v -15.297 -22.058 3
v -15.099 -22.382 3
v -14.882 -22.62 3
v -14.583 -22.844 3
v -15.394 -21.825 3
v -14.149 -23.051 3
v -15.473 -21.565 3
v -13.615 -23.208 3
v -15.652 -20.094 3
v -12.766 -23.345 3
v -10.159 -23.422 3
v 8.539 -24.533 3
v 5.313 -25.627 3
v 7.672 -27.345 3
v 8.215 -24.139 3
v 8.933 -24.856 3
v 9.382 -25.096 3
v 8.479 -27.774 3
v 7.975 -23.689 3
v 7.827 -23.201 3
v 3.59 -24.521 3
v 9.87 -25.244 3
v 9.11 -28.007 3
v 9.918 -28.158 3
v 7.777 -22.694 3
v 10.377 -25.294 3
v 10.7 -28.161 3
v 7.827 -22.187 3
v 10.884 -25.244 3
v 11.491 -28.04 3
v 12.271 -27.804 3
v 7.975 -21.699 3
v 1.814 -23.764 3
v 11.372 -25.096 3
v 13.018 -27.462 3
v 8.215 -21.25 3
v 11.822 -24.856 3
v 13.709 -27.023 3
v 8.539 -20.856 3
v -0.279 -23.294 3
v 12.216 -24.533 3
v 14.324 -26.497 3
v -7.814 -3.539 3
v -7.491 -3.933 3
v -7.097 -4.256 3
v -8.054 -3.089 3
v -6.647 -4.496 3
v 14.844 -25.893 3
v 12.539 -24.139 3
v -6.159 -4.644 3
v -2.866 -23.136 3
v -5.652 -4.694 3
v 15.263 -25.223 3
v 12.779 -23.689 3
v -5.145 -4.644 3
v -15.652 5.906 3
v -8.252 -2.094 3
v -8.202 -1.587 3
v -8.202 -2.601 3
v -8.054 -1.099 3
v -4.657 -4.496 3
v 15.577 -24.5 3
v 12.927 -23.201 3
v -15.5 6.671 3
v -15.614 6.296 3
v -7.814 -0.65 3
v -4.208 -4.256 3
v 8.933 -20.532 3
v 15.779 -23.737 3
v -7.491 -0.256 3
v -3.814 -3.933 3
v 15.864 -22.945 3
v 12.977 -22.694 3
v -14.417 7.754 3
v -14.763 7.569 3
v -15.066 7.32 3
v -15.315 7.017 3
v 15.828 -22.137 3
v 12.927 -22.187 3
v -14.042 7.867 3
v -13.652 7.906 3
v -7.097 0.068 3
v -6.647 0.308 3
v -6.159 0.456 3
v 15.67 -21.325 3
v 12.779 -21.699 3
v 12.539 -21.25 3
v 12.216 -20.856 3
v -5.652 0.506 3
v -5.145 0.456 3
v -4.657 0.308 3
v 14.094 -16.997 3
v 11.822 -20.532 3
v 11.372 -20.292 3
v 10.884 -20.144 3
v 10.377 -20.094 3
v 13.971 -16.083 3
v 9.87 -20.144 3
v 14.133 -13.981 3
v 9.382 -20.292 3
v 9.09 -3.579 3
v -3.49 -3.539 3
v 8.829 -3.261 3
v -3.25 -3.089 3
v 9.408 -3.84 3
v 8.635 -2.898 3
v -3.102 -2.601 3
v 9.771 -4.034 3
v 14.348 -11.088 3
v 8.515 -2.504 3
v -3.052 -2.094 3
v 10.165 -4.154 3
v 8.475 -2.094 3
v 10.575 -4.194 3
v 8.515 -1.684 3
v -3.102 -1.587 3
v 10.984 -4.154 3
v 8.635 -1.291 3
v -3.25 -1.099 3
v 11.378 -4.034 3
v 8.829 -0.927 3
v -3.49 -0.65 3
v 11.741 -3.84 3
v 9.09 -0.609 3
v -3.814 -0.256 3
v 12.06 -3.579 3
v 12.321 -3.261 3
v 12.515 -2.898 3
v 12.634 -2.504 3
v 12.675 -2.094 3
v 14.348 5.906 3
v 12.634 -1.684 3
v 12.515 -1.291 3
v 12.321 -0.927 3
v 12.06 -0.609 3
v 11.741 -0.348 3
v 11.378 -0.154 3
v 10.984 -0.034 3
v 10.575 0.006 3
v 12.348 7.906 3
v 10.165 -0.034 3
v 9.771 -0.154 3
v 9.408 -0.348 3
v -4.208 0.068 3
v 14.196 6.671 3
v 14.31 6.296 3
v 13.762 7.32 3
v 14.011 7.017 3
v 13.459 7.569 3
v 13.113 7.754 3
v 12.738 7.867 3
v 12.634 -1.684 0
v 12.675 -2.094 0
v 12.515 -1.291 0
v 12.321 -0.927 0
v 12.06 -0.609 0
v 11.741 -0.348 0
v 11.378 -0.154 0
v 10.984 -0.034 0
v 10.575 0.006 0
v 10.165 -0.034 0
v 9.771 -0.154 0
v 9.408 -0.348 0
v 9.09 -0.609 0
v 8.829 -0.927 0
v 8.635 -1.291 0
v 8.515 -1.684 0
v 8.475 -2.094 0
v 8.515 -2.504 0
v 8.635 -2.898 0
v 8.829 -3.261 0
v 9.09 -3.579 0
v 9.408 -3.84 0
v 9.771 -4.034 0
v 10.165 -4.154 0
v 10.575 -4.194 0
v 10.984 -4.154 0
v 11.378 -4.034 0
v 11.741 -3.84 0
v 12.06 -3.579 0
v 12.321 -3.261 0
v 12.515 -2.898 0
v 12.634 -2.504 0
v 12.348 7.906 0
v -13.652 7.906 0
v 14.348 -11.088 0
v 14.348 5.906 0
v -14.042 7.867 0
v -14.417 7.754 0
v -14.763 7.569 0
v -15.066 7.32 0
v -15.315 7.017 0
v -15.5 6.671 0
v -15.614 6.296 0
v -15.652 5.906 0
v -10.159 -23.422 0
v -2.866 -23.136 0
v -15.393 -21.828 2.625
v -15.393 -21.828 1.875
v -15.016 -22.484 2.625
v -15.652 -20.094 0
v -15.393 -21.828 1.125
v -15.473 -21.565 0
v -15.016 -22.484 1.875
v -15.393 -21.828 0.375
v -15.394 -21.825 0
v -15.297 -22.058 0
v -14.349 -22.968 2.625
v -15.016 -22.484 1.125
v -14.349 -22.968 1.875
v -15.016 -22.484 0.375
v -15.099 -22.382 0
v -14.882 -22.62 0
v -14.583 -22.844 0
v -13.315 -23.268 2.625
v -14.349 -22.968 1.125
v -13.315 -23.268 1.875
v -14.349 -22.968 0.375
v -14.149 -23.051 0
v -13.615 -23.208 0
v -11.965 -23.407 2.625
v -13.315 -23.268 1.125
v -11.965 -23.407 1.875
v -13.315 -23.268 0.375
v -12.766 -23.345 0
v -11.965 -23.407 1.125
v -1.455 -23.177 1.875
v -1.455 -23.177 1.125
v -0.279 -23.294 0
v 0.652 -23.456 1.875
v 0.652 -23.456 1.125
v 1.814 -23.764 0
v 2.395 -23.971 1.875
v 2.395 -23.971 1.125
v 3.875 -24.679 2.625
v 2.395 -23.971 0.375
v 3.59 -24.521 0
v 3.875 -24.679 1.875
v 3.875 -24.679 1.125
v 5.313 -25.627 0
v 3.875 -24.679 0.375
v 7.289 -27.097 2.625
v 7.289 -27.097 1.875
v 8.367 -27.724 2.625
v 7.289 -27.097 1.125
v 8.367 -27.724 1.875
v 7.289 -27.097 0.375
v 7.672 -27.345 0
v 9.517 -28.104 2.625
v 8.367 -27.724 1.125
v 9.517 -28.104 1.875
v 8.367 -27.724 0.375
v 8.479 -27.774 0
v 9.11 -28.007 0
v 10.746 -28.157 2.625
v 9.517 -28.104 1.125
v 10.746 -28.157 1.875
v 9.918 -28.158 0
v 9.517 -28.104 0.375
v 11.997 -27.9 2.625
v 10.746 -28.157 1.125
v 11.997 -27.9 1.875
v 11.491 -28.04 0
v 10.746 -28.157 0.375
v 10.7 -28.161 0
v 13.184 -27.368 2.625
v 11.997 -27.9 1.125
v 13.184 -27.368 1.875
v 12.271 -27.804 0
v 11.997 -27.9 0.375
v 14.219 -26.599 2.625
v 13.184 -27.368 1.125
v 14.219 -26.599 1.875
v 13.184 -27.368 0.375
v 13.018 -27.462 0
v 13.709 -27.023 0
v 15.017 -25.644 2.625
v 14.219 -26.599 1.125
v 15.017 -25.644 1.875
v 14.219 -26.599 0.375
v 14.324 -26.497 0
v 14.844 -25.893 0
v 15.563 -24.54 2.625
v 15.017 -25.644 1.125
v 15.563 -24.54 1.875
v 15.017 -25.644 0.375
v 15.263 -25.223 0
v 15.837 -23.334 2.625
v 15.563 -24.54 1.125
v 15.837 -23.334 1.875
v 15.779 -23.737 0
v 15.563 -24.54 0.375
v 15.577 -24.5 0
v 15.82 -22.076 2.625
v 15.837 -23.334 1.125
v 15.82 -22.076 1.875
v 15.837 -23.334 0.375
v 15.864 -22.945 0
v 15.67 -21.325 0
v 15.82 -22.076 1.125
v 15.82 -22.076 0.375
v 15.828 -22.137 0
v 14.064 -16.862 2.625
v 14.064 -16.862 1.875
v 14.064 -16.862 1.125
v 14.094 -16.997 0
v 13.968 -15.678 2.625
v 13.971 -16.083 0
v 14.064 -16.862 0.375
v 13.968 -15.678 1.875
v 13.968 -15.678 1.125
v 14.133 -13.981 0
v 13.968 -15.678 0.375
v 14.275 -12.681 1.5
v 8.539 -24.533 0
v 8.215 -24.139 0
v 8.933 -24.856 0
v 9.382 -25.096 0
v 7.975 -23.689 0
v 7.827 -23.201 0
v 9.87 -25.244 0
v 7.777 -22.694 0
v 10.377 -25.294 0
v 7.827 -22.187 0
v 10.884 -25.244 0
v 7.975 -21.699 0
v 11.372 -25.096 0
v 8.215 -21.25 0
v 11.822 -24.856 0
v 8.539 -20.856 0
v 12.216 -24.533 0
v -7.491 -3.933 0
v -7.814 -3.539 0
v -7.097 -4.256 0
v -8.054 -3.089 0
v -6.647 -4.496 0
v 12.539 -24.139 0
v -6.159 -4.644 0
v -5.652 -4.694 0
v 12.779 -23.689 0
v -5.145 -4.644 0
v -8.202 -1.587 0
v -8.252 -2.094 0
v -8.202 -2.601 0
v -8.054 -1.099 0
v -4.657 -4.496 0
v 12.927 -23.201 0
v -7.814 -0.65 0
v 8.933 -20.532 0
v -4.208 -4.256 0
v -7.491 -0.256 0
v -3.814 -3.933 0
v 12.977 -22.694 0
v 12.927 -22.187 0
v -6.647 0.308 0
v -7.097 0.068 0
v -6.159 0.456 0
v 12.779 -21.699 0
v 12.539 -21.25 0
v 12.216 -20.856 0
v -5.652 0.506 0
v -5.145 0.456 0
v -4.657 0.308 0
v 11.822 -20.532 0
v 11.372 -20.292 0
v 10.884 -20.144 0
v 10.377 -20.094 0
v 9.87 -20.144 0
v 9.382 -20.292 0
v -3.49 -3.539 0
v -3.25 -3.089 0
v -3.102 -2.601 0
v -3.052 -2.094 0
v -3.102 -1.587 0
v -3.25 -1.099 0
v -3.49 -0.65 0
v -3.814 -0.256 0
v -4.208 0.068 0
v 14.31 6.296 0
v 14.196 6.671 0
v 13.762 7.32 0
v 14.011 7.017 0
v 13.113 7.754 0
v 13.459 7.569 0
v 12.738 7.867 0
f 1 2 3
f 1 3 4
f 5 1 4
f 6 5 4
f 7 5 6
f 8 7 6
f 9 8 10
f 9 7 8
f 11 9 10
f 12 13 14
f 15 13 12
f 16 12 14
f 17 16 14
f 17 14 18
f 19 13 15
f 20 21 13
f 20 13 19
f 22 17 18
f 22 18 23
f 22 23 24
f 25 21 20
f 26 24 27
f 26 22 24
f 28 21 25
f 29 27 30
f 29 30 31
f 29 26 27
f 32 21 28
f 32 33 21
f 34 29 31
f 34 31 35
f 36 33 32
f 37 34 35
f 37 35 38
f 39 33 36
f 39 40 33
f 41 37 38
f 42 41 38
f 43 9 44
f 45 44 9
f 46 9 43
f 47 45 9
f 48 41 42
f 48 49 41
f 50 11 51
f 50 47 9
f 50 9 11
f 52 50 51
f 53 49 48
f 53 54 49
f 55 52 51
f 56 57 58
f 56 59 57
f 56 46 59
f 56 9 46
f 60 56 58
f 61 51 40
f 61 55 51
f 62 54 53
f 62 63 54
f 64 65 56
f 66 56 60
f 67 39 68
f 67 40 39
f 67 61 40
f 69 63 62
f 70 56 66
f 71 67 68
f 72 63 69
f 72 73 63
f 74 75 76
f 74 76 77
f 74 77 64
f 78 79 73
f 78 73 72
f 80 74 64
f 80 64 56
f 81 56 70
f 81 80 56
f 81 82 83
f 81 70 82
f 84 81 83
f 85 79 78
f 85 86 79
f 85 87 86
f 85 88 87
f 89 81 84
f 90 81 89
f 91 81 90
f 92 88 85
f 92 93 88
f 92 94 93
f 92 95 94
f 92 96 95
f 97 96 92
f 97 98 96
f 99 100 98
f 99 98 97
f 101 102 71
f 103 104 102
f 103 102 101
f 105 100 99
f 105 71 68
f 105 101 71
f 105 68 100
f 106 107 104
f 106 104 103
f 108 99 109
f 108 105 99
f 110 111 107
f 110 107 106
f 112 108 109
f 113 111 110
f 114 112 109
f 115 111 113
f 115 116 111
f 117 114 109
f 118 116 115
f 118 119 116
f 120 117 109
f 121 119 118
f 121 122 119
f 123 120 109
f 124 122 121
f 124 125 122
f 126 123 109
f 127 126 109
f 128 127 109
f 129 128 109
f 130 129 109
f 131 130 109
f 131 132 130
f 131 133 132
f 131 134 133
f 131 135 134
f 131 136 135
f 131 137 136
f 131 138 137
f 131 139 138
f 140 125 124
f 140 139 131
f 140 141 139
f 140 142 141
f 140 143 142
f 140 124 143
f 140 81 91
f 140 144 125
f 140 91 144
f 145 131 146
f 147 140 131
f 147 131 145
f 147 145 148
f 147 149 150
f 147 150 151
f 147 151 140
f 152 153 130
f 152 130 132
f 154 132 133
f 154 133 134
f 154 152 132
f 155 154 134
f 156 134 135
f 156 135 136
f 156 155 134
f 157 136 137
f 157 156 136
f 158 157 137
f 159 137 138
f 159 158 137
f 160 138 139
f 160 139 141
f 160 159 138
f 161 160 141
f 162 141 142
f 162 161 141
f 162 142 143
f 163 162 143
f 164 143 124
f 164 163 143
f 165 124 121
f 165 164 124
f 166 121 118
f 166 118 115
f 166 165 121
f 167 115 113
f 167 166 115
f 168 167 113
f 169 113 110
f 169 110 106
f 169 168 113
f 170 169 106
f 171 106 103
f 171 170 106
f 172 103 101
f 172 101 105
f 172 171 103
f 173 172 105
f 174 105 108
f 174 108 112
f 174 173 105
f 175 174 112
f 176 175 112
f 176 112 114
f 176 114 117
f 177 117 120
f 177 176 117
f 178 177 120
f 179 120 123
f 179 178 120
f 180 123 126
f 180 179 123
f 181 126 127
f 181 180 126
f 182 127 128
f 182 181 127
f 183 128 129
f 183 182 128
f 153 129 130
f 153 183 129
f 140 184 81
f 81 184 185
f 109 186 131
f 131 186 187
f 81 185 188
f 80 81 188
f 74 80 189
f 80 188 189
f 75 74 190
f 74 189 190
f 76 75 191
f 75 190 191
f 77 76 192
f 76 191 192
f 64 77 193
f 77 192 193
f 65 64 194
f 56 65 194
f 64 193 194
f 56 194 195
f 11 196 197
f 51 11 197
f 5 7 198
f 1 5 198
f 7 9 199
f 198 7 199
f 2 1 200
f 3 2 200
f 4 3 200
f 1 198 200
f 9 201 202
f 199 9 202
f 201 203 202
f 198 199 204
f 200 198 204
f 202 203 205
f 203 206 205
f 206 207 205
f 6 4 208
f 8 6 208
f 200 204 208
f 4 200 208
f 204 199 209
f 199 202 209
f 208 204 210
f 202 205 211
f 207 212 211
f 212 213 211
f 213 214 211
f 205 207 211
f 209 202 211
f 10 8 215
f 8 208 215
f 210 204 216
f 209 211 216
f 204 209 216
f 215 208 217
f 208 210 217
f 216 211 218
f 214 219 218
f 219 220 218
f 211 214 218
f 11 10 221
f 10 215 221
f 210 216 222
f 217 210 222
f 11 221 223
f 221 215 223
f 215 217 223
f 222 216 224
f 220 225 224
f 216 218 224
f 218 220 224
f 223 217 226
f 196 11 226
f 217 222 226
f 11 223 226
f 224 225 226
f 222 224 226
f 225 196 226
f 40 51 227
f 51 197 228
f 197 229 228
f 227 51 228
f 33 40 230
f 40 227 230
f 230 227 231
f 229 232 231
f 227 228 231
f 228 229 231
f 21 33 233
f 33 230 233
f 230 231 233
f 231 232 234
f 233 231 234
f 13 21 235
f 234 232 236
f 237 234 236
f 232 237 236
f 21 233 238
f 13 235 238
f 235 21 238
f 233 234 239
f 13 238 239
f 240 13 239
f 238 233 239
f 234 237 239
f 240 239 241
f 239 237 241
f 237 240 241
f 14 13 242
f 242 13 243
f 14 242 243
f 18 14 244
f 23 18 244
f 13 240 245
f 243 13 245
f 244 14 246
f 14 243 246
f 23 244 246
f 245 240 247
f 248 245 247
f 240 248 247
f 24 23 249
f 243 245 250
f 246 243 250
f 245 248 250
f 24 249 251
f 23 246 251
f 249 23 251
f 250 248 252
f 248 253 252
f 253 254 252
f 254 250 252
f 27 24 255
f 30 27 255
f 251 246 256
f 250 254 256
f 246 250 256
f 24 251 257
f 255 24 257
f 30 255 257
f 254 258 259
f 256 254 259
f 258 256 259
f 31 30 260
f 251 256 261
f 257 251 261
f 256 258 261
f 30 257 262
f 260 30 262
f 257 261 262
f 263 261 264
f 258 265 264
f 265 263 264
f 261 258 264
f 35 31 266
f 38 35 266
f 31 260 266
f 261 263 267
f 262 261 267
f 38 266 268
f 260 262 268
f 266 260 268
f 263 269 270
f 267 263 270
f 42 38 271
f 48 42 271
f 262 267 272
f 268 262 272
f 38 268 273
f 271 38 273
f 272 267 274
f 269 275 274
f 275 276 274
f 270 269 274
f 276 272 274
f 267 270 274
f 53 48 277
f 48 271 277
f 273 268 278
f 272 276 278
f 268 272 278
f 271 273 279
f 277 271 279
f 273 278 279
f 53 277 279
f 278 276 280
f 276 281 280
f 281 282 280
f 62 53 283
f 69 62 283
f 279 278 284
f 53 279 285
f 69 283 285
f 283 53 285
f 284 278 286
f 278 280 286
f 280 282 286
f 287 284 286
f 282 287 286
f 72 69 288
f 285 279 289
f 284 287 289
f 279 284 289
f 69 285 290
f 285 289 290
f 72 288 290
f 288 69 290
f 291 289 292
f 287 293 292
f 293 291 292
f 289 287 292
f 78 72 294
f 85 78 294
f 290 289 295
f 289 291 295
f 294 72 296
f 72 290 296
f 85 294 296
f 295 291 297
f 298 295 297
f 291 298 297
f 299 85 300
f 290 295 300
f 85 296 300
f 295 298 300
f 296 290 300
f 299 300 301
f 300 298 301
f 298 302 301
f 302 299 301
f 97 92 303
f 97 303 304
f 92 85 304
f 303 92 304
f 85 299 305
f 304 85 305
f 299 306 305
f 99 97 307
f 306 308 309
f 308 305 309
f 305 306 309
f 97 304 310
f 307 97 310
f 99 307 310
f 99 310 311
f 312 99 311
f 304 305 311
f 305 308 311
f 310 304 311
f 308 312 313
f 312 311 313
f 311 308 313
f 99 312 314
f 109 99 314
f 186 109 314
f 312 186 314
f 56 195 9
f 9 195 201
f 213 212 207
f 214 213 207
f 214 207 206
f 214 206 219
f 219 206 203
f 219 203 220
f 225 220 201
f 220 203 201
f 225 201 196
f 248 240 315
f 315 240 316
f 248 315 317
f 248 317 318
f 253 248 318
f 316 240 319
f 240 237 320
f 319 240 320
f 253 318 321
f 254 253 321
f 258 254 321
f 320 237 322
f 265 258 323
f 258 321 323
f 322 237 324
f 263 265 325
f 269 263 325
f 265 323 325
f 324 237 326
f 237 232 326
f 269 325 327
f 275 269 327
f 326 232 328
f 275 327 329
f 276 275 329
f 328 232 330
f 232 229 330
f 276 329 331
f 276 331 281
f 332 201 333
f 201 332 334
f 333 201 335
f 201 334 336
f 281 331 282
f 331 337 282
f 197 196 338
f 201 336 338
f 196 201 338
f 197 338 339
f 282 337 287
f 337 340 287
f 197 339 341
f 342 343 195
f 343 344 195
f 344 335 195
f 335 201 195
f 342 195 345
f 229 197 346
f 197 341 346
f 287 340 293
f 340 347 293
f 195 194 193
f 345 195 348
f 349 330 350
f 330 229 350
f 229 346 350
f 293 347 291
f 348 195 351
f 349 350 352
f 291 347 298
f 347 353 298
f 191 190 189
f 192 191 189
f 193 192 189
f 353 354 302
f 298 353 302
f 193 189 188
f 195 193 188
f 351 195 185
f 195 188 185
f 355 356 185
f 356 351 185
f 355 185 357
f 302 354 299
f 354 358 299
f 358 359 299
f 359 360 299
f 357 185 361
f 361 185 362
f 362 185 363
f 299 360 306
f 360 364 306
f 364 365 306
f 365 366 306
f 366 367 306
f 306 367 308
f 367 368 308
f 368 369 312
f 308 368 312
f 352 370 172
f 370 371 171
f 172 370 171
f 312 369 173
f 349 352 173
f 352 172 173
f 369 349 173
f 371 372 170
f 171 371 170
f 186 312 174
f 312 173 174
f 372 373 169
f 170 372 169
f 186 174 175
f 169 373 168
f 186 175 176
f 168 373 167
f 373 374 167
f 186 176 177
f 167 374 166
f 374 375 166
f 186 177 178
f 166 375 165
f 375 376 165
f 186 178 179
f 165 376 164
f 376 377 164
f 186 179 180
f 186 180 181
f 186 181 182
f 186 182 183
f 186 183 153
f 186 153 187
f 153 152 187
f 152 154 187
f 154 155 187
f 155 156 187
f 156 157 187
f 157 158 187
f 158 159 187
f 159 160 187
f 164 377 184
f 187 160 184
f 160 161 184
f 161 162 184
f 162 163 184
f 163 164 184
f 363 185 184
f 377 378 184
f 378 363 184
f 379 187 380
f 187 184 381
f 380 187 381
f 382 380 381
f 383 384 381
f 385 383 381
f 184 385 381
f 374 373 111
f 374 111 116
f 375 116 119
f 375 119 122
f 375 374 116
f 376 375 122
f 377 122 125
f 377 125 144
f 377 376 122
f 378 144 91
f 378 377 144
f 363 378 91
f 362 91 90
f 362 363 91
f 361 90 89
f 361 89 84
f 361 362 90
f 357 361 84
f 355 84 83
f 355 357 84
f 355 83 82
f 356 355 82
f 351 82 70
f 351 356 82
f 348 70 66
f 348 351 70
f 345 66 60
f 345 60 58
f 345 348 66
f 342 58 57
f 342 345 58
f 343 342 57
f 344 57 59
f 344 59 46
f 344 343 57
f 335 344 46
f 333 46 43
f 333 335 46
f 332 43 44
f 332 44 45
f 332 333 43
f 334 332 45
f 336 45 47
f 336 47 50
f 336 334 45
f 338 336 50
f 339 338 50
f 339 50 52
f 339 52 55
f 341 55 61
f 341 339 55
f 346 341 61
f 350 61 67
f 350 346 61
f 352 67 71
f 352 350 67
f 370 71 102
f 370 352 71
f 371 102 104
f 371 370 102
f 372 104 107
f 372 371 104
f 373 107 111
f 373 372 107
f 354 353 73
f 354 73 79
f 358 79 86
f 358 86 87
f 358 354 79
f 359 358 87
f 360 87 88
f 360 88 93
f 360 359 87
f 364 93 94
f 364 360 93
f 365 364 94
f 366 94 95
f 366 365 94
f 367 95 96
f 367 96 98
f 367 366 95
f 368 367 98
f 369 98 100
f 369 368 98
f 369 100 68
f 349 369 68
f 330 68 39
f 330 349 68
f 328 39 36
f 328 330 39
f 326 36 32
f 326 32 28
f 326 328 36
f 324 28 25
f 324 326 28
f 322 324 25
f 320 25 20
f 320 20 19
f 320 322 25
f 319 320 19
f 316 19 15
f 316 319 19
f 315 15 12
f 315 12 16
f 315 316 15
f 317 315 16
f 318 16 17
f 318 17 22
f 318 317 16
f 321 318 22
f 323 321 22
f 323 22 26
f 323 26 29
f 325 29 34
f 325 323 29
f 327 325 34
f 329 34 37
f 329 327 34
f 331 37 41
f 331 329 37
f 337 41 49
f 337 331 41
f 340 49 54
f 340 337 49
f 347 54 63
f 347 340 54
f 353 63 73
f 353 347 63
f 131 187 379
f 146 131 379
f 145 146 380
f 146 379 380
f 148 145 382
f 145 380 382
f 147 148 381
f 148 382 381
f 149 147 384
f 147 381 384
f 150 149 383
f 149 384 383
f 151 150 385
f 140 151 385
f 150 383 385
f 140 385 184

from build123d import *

# Parameters (mm, degrees)
F0_R     = 2.6
F0_R_2   = 2.1
F1_DEPTH = 3


with BuildPart() as f1:
    # F0 (on Top) → F1 (new body)
    with BuildSketch(Plane.XY):
        with BuildLine():
            Line((12.3479472026, 7.9058583081), (-13.6520527974, 7.9058583081))
            ThreePointArc((-13.6520527974, 7.9058583081), (-15.0662663598, 7.3200718704), (-15.6520527974, 5.9058583081))
            Line((-15.6520527974, 5.9058583081), (-15.6520527974, -20.0941416919))
            add(Edge.make_bspline(
                [(-15.6520527974, -20.0941416919), (-15.5751293037, -21.4033594279), (-15.2635781681, -24.5634502002), (-0.8787874809, -22.0988449664), (5.0756230648, -25.1076771756), (9.2072850265, -29.0327234408), (14.8289471052, -27.1474559823), (16.6930721896, -21.9723878023), (13.1588311211, -16.5555052211), (14.3295111489, -13.9155043625), (14.3479472026, -11.0878590494)],
                knots=[0, 0, 0, 0, 0.0914376173, 0.2762733003, 0.4129615686, 0.5284098194, 0.6427719716, 0.7555166389, 0.8762466025, 1, 1, 1, 1], degree=3))
            Line((14.3479472026, -11.0878590494), (14.3479472026, 5.9058583081))
            ThreePointArc((14.3479472026, 5.9058583081), (13.762160765, 7.3200718704), (12.3479472026, 7.9058583081))
        make_face()
        with Locations((10.3771137074, -22.6941416919)):
            Circle(F0_R, mode=Mode.SUBTRACT)
        with Locations((-5.6520527974, -2.0941416919)):
            Circle(F0_R, mode=Mode.SUBTRACT)
        with Locations((10.5747394032, -2.0941416919)):
            Circle(F0_R_2, mode=Mode.SUBTRACT)
    extrude(amount=F1_DEPTH)


solid = f1.part
